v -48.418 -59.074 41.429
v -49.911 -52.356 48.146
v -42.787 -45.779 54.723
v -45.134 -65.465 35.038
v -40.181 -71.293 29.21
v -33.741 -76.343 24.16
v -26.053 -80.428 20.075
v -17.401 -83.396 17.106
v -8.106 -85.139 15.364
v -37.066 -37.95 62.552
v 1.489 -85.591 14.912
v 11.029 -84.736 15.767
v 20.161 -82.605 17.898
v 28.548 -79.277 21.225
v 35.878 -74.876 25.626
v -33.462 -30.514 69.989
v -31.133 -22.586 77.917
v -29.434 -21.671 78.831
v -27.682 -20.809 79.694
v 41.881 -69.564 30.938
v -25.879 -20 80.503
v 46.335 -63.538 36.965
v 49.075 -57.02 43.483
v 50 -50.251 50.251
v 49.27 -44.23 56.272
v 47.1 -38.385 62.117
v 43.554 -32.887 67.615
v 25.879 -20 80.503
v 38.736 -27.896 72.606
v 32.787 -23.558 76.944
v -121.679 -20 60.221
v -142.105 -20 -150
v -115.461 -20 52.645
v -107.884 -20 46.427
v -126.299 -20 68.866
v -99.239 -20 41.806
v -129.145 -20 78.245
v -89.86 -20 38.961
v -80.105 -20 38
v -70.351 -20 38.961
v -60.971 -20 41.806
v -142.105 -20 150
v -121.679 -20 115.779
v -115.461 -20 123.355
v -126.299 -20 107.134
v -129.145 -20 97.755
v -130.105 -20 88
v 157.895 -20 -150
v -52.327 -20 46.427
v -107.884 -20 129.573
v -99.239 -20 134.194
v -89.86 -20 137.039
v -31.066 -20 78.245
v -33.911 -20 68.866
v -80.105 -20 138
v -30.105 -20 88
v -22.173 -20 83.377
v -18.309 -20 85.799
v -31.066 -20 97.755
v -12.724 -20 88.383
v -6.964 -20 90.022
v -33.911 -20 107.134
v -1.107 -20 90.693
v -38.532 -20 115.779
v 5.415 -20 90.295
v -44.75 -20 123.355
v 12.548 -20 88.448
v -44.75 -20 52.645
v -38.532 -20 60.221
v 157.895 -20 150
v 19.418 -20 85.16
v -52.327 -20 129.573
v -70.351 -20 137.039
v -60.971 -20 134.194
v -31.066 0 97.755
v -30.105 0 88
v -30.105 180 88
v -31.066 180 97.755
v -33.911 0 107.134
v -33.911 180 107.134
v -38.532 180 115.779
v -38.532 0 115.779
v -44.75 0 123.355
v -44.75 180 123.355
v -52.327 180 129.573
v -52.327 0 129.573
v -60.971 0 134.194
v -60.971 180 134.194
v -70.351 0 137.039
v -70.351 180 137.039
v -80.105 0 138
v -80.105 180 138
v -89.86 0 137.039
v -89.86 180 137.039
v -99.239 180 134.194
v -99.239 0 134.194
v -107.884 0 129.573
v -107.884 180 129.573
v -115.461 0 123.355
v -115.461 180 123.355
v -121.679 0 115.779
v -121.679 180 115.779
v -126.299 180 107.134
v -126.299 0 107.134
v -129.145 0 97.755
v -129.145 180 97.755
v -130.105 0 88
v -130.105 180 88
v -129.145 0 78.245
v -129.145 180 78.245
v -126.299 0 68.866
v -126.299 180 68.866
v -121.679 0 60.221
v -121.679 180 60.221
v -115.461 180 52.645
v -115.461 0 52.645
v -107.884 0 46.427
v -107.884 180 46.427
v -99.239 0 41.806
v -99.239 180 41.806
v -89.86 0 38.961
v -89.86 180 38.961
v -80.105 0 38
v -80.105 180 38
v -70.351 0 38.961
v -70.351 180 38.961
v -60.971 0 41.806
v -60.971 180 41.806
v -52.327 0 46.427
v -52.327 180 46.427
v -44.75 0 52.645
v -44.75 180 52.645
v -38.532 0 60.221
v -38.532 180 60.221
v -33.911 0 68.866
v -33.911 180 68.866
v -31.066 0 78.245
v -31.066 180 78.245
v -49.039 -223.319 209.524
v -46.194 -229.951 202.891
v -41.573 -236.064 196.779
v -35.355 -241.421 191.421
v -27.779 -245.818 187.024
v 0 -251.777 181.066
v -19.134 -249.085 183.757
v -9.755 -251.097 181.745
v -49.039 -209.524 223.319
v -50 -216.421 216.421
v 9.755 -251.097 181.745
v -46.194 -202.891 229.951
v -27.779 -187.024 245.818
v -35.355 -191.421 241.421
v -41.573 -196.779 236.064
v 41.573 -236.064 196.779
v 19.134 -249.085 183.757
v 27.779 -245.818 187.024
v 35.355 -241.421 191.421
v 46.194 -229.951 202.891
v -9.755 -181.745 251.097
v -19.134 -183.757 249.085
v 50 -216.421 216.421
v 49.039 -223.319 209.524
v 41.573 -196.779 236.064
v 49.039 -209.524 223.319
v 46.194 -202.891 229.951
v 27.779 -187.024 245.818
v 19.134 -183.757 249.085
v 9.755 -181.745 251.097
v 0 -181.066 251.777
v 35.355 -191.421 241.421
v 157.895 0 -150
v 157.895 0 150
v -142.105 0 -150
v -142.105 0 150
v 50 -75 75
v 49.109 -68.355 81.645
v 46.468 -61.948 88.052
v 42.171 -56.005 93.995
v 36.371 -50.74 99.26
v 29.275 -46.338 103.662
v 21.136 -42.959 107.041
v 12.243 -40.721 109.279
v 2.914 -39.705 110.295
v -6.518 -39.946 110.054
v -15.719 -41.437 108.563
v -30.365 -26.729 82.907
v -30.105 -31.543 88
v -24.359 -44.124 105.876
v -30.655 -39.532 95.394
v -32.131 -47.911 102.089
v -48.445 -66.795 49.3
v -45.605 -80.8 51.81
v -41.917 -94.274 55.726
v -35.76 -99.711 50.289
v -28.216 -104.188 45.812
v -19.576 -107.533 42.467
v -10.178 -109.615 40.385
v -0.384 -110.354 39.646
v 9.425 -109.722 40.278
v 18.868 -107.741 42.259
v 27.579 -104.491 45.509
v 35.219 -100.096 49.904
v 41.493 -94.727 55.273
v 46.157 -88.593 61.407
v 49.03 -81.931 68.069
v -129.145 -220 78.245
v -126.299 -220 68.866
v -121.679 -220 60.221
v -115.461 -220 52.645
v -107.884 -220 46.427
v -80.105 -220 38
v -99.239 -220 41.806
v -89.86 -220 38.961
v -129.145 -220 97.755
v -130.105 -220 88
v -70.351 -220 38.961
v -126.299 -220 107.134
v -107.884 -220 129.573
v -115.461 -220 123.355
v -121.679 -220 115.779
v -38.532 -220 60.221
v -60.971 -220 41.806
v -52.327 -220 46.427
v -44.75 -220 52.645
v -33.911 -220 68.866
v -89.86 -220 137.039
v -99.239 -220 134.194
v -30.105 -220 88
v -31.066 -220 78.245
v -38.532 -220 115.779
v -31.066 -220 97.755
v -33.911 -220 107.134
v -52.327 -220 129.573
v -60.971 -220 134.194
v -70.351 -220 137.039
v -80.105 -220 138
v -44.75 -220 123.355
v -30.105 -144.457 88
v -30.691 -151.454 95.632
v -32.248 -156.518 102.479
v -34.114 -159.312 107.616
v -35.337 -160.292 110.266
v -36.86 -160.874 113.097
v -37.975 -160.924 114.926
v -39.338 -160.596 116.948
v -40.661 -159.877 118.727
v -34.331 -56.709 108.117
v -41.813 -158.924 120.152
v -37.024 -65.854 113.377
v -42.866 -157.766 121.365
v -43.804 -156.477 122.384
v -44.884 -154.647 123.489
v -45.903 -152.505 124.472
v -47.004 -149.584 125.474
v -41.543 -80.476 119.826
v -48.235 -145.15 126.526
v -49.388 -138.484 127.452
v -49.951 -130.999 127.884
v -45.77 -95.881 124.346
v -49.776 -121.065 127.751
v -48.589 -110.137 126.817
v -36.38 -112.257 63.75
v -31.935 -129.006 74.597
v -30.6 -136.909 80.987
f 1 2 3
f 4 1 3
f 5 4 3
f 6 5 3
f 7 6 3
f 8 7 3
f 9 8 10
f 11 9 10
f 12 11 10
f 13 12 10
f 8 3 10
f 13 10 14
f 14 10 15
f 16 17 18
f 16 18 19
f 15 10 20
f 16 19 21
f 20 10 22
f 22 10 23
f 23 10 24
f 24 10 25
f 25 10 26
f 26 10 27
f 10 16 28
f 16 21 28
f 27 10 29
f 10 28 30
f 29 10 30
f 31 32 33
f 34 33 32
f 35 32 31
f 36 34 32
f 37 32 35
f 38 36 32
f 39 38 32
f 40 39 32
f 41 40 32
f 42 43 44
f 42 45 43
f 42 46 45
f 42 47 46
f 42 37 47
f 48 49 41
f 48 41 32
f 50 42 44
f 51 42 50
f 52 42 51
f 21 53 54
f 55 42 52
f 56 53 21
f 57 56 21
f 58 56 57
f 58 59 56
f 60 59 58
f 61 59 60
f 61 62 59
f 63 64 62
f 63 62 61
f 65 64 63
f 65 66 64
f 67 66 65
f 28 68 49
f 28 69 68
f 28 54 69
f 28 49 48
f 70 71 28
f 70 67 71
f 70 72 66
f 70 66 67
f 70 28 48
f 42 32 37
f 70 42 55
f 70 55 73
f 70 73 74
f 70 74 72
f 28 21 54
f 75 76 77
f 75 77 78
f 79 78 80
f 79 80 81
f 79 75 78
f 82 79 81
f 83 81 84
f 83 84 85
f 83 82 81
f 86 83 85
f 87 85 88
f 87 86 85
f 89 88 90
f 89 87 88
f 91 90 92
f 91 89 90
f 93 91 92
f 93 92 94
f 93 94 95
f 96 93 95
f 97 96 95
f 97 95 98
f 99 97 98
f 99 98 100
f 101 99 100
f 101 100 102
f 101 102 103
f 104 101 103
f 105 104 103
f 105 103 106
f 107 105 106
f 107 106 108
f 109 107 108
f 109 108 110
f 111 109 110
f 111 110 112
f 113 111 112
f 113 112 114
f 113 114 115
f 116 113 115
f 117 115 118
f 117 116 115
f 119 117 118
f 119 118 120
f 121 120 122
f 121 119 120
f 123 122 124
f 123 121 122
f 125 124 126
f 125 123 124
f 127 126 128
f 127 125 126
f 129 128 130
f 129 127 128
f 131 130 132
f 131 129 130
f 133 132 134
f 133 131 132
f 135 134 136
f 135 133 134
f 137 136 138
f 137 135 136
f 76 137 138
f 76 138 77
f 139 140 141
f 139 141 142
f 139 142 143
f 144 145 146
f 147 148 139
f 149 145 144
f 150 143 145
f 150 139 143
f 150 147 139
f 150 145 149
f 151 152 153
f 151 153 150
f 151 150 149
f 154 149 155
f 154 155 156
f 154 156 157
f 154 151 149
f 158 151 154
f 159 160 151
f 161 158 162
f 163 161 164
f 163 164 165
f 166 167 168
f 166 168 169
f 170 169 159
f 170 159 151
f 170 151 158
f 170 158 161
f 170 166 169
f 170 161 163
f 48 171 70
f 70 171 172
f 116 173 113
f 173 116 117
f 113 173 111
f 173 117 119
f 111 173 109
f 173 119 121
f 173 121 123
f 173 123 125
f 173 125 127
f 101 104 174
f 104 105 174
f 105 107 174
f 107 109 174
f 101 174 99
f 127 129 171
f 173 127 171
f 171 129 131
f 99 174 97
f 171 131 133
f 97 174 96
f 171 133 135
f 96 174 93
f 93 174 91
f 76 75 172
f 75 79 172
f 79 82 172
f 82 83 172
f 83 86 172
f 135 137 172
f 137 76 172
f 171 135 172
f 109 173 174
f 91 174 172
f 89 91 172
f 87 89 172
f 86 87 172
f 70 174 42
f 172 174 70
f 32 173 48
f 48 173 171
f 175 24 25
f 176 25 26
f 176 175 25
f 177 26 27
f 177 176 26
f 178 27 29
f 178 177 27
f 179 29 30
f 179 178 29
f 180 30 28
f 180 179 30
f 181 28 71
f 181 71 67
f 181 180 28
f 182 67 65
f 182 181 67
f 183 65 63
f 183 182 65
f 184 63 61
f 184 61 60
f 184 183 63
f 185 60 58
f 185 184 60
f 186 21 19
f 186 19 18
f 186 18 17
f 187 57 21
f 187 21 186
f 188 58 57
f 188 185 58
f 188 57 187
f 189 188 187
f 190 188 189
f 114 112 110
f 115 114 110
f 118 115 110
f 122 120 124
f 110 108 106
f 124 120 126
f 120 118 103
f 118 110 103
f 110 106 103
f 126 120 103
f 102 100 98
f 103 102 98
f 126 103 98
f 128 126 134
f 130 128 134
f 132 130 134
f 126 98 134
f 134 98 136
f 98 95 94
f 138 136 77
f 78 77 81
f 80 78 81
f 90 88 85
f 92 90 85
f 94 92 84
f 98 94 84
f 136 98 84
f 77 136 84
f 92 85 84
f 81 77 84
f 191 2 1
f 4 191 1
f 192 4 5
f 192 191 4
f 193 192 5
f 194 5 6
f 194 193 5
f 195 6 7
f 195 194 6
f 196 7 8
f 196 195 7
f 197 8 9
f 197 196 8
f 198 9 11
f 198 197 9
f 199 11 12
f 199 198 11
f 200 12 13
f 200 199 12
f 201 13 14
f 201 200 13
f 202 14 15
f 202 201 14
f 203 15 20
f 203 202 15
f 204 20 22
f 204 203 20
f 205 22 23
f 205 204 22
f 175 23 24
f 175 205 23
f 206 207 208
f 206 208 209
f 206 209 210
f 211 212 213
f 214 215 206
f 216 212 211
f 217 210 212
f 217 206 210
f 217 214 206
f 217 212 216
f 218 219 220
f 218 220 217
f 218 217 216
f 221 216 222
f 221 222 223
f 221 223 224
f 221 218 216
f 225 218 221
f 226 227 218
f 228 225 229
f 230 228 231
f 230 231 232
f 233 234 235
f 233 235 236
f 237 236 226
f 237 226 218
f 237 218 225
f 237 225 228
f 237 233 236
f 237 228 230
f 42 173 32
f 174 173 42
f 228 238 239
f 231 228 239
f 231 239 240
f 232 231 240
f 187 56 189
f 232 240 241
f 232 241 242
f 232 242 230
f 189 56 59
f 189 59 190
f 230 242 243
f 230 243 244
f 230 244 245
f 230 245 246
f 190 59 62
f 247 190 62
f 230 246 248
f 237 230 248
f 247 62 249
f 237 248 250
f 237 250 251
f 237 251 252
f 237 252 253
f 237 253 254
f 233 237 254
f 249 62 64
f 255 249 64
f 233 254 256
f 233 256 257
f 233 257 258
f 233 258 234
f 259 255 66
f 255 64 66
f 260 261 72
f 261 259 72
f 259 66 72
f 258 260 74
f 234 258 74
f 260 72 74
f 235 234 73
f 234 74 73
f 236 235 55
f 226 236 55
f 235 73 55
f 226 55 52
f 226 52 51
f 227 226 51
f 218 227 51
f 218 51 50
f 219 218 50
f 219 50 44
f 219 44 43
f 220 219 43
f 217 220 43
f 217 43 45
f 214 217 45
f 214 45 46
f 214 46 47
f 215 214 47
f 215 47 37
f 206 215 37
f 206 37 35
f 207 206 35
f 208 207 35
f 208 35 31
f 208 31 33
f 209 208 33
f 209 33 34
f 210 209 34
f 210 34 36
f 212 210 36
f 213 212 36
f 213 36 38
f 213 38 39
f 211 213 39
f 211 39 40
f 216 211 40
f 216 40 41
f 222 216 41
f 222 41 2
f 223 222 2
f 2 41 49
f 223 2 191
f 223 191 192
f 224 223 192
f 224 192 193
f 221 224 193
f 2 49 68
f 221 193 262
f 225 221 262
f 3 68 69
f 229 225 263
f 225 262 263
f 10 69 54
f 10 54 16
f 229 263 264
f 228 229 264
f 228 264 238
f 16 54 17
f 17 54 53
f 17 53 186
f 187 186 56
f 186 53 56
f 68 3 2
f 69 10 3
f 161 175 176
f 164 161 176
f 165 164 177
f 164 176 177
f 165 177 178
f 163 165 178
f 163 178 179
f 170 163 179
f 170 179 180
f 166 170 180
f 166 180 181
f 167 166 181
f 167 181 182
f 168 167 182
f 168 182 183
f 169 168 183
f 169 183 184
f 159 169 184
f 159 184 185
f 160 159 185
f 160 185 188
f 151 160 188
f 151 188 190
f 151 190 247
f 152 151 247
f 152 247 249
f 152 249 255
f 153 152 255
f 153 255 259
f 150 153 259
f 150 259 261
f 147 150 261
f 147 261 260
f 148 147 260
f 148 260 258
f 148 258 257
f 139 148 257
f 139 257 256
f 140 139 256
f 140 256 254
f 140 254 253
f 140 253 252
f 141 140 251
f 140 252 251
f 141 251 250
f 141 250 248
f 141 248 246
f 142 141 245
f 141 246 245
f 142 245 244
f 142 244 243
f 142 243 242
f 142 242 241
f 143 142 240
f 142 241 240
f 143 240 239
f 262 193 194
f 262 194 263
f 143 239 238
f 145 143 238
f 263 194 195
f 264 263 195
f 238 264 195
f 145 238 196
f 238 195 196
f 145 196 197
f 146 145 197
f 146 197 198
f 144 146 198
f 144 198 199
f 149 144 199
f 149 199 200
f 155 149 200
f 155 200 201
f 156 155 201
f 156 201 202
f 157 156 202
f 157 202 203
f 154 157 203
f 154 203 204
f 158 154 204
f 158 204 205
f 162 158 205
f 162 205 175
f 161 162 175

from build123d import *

# Parameters (mm, degrees)
F0_W          = 300
F0_H          = 300
F1_DEPTH      = 20
F2_R          = 50
F3_DEPTH      = 200
F3_DEPTH_BACK = 200
F5_R          = 50
F6_DEPTH      = 200
F6_DEPTH_BACK = 35


with BuildPart() as f1:
    # F0 (on Front) → F1 (new body)
    with BuildSketch(Plane.XZ):
        with Locations((7.894735, 0)):
            Rectangle(F0_W, F0_H)
    extrude(amount=F1_DEPTH)

    # F2 (on face) → F3 (join, two sides)
    with BuildSketch(Plane.XZ.offset(20)) as f3_sk:
        with Locations((-80.105265, 88)):
            Circle(F2_R)
    extrude(amount=F3_DEPTH)
    extrude(f3_sk.sketch, amount=-F3_DEPTH_BACK)

    # F5 (on face) → F6 (join, two sides)
    with BuildSketch(Plane(origin=(0, -75, 75), x_dir=(1, 0, 0), z_dir=(0, -0.707107, 0.707107))) as f6_sk:
        Circle(F5_R)
    extrude(amount=F6_DEPTH)
    extrude(f6_sk.sketch, amount=-F6_DEPTH_BACK)


solid = f1.part
